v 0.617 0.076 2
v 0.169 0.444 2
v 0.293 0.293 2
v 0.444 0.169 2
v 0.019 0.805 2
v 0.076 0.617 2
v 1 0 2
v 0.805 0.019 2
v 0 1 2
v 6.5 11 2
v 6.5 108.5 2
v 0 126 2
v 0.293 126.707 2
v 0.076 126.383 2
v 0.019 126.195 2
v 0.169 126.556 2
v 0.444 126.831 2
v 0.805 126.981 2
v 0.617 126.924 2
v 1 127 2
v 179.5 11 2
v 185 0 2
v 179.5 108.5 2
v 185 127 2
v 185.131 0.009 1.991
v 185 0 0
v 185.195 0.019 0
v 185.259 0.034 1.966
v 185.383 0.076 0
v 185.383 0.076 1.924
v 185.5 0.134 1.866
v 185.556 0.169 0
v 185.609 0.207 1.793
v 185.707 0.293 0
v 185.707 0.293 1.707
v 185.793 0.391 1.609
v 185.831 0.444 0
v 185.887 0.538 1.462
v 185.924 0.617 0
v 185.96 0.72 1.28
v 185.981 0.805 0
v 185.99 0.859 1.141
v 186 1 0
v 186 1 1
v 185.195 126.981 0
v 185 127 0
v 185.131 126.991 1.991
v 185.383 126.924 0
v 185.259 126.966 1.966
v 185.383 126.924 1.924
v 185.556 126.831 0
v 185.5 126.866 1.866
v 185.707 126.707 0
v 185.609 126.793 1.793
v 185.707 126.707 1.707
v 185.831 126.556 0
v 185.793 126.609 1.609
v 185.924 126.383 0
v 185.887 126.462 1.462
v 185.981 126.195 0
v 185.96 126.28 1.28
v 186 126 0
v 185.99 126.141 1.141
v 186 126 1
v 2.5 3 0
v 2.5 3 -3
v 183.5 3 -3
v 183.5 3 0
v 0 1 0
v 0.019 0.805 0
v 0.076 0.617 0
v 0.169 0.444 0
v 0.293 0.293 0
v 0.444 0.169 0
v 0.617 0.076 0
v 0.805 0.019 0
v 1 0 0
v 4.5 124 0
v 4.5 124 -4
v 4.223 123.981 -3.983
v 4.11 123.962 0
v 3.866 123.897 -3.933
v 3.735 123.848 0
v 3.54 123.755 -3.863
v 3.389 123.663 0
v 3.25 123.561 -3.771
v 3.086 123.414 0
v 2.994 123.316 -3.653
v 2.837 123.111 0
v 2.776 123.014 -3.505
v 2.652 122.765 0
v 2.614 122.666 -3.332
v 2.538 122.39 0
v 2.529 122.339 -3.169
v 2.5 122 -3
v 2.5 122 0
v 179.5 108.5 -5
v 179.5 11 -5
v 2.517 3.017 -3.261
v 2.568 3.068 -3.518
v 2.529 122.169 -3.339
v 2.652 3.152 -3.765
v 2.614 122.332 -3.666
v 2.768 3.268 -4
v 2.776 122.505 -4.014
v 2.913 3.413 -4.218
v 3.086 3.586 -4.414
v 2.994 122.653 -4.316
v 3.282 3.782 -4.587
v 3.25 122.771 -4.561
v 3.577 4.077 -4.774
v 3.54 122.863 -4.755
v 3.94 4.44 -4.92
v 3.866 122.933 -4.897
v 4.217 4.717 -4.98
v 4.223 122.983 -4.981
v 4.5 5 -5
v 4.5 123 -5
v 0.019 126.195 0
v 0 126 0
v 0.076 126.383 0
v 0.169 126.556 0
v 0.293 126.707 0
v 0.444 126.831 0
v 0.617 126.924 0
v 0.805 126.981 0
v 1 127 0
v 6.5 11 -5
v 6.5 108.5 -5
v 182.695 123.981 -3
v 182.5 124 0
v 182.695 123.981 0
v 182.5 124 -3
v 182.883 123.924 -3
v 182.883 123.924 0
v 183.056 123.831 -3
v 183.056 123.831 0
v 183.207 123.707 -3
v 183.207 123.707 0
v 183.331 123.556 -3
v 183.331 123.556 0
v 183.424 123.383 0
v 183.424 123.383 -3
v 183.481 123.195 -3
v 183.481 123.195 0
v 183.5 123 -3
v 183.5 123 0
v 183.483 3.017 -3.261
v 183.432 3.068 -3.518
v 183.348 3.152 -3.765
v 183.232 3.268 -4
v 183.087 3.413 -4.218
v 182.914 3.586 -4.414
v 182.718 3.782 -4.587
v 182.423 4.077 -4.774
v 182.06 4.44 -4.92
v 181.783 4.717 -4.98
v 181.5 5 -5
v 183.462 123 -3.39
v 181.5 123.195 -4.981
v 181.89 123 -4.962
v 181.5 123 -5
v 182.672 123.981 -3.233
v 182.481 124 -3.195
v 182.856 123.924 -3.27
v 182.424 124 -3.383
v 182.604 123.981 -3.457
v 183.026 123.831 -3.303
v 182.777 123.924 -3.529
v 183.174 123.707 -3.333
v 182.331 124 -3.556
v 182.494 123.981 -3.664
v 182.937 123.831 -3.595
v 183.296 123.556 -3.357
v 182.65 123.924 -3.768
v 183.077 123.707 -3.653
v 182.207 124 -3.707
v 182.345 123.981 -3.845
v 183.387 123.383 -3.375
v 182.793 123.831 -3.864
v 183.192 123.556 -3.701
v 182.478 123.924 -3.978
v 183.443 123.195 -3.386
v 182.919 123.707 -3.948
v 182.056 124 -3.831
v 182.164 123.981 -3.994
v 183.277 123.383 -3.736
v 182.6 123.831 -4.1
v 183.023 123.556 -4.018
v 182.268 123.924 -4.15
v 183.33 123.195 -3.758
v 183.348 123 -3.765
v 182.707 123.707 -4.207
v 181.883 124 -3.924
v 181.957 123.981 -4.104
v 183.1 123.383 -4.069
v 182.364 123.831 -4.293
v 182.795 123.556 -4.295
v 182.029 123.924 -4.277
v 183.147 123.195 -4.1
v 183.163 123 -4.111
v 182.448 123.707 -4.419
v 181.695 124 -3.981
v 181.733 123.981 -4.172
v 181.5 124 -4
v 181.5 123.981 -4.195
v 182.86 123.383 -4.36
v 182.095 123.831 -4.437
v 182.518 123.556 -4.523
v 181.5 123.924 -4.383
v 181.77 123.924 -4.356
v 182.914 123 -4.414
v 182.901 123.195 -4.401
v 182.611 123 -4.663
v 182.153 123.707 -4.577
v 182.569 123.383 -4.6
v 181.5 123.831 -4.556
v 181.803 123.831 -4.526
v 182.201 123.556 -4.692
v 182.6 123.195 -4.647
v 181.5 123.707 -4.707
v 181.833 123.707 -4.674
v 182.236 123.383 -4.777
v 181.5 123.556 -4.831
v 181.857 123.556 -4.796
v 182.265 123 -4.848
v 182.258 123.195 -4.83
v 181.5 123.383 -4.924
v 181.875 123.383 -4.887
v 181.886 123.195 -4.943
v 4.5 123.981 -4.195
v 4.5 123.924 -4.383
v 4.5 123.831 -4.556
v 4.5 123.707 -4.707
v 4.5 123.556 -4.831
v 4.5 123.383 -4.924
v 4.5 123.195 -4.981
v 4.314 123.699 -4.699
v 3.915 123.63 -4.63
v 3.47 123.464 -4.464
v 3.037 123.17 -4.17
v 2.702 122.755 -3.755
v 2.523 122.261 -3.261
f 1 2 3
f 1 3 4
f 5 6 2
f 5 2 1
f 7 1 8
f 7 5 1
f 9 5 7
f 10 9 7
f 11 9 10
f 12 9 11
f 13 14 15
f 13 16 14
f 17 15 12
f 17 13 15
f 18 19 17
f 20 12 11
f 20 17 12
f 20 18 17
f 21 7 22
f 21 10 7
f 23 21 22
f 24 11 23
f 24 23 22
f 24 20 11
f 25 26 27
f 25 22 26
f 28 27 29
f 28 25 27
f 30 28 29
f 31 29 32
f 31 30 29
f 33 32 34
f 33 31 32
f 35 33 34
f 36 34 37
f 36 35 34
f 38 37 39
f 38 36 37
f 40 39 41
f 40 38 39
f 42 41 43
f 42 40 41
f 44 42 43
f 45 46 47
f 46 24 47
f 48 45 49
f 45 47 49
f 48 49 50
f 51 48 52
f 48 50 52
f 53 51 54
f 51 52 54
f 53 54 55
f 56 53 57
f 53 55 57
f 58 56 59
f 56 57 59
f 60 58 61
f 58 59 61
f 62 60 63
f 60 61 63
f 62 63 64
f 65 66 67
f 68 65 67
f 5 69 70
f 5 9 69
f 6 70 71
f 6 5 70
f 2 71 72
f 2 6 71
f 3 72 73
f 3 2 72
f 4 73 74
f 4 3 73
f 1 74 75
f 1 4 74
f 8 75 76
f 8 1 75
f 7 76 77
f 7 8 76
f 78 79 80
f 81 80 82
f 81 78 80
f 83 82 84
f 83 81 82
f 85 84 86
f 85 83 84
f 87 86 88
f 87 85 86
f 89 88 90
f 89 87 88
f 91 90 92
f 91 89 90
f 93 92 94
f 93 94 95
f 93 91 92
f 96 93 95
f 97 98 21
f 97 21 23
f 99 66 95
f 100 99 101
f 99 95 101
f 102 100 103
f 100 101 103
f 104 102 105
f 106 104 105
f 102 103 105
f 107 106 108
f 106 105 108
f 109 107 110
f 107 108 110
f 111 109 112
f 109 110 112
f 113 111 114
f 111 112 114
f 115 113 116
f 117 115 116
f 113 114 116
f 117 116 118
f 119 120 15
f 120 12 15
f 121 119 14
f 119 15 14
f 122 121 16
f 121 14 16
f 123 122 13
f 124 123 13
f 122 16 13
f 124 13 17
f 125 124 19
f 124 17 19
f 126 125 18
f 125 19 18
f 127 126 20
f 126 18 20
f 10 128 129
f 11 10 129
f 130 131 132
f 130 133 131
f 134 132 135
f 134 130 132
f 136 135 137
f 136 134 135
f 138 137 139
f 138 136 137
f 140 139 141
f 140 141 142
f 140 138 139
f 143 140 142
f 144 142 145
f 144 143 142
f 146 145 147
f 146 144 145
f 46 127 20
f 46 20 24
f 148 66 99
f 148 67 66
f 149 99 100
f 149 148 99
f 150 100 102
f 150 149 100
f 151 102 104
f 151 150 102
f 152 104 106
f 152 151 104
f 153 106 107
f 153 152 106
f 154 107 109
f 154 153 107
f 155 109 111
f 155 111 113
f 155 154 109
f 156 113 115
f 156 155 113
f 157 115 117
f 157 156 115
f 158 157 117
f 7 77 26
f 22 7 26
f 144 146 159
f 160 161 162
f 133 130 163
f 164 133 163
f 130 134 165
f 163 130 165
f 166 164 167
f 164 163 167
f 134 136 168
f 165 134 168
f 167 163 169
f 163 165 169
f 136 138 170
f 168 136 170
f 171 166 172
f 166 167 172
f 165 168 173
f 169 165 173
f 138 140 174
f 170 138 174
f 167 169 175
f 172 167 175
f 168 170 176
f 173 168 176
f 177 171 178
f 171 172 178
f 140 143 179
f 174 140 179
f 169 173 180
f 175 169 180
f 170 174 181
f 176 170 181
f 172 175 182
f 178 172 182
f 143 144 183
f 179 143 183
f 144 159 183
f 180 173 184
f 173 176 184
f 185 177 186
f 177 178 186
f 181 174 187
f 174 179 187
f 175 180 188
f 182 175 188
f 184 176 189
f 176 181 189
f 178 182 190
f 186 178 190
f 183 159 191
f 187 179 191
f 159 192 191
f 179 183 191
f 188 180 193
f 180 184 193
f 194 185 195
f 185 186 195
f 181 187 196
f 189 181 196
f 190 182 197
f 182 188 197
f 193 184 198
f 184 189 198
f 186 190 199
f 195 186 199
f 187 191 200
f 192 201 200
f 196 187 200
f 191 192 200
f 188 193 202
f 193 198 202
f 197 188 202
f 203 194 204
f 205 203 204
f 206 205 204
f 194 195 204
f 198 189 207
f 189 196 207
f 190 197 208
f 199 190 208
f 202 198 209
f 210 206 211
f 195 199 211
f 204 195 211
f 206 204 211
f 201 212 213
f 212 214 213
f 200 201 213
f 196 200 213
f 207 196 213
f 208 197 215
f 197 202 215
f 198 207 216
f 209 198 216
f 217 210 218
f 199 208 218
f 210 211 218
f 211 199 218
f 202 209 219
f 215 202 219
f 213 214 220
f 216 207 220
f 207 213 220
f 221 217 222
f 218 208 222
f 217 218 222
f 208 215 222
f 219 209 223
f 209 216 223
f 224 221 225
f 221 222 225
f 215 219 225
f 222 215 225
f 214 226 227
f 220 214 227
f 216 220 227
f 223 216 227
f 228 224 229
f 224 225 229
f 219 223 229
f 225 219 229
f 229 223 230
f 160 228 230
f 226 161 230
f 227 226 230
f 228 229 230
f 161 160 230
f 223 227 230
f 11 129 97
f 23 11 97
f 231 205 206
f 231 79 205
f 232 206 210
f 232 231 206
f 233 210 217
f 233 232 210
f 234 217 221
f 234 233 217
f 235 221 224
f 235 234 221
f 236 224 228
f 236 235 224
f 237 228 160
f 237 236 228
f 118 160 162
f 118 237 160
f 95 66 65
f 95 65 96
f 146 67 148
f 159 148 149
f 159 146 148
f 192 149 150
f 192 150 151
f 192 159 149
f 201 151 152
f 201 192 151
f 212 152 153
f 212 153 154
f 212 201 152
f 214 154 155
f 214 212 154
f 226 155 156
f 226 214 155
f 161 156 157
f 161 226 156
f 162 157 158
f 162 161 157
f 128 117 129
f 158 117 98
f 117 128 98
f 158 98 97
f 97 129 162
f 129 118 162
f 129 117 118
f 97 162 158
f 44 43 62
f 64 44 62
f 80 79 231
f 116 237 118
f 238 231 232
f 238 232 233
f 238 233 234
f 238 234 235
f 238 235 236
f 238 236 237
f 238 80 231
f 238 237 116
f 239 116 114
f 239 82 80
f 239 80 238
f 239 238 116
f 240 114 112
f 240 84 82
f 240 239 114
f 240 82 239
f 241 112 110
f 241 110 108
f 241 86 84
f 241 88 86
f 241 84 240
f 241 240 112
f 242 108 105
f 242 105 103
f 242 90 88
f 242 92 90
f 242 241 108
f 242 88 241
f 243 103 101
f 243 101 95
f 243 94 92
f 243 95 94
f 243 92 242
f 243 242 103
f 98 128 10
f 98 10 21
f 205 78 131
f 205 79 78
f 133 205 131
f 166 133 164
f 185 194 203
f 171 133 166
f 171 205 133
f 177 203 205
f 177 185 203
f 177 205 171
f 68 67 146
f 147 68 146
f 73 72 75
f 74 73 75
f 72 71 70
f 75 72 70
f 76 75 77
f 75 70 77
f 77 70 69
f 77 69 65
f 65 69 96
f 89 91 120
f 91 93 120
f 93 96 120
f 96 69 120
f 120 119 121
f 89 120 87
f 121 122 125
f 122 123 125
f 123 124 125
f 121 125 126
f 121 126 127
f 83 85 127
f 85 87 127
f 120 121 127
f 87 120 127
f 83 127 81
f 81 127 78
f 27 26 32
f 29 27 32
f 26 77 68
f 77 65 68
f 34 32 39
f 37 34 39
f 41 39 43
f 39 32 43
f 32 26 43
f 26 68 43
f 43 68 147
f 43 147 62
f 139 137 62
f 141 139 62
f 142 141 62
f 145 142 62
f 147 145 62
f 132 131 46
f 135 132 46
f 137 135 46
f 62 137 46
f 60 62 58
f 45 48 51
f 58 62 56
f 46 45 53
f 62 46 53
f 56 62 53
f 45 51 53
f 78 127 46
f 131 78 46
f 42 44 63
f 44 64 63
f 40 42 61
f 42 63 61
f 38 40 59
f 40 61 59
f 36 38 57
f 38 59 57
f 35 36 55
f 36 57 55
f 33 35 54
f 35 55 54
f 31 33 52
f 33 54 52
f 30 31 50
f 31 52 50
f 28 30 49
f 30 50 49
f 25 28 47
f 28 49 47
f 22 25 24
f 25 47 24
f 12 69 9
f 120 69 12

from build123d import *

# Parameters (mm, degrees)
BOX018_W     = 173
BOX018_H     = 97.5
BOX018_DEPTH = 30
BOX019_W     = 181
BOX019_H     = 121
BOX019_DEPTH = 5
BOX017_W     = 186
BOX017_H     = 127
BOX017_DEPTH = 2
FILLET008_R  = 2
FILLET009_R  = 1


with BuildPart() as cutout:
    # Box018 → Box018 (new body)
    with BuildSketch(Plane(origin=(6.5, 11, -25), x_dir=(1, 0, 0), z_dir=(0, 0, 1))):
        with Locations((86.5, 48.75)):
            Rectangle(BOX018_W, BOX018_H)
    extrude(amount=BOX018_DEPTH)


with BuildPart() as cube016:
    # Box019 → Box019 (new body)
    with BuildSketch(Plane(origin=(2.5, 3, -5), x_dir=(1, 0, 0), z_dir=(0, 0, 1))):
        with Locations((90.5, 60.5)):
            Rectangle(BOX019_W, BOX019_H)
    extrude(amount=BOX019_DEPTH)


with BuildPart() as fascia:
    # Box017 → Box017 (new body)
    with BuildSketch(Plane.XY):
        with Locations((93, 63.5)):
            Rectangle(BOX017_W, BOX017_H)
    extrude(amount=BOX017_DEPTH)

    # Fusion007: union Cube016
    add(cube016.part)

    # Cut007: cut Cutout
    add(cutout.part, mode=Mode.SUBTRACT)

    # Fillet008
    fillet008_edges = [fascia.edges().sort_by_distance(p)[0] for p in [
        (2.5, 124, -2.5),
        (2.5, 63.5, -5),
        (93, 3, -5),
        (183.5, 63.5, -5),
    ]]
    fillet(fillet008_edges, radius=FILLET008_R)

    # Fillet009
    fillet009_edges = [fascia.edges().sort_by_distance(p)[0] for p in [
        (2.973408, 123.292098, -4.292098),
        (93, 3, -3),
        (183.5, 124, -1.5),
        (0, 0, 1),
        (0, 127, 1),
        (186, 127, 1),
        (186, 0, 1),
        (186, 63.5, 2),
    ]]
    fillet(fillet009_edges, radius=FILLET009_R)


solid = fascia.part
